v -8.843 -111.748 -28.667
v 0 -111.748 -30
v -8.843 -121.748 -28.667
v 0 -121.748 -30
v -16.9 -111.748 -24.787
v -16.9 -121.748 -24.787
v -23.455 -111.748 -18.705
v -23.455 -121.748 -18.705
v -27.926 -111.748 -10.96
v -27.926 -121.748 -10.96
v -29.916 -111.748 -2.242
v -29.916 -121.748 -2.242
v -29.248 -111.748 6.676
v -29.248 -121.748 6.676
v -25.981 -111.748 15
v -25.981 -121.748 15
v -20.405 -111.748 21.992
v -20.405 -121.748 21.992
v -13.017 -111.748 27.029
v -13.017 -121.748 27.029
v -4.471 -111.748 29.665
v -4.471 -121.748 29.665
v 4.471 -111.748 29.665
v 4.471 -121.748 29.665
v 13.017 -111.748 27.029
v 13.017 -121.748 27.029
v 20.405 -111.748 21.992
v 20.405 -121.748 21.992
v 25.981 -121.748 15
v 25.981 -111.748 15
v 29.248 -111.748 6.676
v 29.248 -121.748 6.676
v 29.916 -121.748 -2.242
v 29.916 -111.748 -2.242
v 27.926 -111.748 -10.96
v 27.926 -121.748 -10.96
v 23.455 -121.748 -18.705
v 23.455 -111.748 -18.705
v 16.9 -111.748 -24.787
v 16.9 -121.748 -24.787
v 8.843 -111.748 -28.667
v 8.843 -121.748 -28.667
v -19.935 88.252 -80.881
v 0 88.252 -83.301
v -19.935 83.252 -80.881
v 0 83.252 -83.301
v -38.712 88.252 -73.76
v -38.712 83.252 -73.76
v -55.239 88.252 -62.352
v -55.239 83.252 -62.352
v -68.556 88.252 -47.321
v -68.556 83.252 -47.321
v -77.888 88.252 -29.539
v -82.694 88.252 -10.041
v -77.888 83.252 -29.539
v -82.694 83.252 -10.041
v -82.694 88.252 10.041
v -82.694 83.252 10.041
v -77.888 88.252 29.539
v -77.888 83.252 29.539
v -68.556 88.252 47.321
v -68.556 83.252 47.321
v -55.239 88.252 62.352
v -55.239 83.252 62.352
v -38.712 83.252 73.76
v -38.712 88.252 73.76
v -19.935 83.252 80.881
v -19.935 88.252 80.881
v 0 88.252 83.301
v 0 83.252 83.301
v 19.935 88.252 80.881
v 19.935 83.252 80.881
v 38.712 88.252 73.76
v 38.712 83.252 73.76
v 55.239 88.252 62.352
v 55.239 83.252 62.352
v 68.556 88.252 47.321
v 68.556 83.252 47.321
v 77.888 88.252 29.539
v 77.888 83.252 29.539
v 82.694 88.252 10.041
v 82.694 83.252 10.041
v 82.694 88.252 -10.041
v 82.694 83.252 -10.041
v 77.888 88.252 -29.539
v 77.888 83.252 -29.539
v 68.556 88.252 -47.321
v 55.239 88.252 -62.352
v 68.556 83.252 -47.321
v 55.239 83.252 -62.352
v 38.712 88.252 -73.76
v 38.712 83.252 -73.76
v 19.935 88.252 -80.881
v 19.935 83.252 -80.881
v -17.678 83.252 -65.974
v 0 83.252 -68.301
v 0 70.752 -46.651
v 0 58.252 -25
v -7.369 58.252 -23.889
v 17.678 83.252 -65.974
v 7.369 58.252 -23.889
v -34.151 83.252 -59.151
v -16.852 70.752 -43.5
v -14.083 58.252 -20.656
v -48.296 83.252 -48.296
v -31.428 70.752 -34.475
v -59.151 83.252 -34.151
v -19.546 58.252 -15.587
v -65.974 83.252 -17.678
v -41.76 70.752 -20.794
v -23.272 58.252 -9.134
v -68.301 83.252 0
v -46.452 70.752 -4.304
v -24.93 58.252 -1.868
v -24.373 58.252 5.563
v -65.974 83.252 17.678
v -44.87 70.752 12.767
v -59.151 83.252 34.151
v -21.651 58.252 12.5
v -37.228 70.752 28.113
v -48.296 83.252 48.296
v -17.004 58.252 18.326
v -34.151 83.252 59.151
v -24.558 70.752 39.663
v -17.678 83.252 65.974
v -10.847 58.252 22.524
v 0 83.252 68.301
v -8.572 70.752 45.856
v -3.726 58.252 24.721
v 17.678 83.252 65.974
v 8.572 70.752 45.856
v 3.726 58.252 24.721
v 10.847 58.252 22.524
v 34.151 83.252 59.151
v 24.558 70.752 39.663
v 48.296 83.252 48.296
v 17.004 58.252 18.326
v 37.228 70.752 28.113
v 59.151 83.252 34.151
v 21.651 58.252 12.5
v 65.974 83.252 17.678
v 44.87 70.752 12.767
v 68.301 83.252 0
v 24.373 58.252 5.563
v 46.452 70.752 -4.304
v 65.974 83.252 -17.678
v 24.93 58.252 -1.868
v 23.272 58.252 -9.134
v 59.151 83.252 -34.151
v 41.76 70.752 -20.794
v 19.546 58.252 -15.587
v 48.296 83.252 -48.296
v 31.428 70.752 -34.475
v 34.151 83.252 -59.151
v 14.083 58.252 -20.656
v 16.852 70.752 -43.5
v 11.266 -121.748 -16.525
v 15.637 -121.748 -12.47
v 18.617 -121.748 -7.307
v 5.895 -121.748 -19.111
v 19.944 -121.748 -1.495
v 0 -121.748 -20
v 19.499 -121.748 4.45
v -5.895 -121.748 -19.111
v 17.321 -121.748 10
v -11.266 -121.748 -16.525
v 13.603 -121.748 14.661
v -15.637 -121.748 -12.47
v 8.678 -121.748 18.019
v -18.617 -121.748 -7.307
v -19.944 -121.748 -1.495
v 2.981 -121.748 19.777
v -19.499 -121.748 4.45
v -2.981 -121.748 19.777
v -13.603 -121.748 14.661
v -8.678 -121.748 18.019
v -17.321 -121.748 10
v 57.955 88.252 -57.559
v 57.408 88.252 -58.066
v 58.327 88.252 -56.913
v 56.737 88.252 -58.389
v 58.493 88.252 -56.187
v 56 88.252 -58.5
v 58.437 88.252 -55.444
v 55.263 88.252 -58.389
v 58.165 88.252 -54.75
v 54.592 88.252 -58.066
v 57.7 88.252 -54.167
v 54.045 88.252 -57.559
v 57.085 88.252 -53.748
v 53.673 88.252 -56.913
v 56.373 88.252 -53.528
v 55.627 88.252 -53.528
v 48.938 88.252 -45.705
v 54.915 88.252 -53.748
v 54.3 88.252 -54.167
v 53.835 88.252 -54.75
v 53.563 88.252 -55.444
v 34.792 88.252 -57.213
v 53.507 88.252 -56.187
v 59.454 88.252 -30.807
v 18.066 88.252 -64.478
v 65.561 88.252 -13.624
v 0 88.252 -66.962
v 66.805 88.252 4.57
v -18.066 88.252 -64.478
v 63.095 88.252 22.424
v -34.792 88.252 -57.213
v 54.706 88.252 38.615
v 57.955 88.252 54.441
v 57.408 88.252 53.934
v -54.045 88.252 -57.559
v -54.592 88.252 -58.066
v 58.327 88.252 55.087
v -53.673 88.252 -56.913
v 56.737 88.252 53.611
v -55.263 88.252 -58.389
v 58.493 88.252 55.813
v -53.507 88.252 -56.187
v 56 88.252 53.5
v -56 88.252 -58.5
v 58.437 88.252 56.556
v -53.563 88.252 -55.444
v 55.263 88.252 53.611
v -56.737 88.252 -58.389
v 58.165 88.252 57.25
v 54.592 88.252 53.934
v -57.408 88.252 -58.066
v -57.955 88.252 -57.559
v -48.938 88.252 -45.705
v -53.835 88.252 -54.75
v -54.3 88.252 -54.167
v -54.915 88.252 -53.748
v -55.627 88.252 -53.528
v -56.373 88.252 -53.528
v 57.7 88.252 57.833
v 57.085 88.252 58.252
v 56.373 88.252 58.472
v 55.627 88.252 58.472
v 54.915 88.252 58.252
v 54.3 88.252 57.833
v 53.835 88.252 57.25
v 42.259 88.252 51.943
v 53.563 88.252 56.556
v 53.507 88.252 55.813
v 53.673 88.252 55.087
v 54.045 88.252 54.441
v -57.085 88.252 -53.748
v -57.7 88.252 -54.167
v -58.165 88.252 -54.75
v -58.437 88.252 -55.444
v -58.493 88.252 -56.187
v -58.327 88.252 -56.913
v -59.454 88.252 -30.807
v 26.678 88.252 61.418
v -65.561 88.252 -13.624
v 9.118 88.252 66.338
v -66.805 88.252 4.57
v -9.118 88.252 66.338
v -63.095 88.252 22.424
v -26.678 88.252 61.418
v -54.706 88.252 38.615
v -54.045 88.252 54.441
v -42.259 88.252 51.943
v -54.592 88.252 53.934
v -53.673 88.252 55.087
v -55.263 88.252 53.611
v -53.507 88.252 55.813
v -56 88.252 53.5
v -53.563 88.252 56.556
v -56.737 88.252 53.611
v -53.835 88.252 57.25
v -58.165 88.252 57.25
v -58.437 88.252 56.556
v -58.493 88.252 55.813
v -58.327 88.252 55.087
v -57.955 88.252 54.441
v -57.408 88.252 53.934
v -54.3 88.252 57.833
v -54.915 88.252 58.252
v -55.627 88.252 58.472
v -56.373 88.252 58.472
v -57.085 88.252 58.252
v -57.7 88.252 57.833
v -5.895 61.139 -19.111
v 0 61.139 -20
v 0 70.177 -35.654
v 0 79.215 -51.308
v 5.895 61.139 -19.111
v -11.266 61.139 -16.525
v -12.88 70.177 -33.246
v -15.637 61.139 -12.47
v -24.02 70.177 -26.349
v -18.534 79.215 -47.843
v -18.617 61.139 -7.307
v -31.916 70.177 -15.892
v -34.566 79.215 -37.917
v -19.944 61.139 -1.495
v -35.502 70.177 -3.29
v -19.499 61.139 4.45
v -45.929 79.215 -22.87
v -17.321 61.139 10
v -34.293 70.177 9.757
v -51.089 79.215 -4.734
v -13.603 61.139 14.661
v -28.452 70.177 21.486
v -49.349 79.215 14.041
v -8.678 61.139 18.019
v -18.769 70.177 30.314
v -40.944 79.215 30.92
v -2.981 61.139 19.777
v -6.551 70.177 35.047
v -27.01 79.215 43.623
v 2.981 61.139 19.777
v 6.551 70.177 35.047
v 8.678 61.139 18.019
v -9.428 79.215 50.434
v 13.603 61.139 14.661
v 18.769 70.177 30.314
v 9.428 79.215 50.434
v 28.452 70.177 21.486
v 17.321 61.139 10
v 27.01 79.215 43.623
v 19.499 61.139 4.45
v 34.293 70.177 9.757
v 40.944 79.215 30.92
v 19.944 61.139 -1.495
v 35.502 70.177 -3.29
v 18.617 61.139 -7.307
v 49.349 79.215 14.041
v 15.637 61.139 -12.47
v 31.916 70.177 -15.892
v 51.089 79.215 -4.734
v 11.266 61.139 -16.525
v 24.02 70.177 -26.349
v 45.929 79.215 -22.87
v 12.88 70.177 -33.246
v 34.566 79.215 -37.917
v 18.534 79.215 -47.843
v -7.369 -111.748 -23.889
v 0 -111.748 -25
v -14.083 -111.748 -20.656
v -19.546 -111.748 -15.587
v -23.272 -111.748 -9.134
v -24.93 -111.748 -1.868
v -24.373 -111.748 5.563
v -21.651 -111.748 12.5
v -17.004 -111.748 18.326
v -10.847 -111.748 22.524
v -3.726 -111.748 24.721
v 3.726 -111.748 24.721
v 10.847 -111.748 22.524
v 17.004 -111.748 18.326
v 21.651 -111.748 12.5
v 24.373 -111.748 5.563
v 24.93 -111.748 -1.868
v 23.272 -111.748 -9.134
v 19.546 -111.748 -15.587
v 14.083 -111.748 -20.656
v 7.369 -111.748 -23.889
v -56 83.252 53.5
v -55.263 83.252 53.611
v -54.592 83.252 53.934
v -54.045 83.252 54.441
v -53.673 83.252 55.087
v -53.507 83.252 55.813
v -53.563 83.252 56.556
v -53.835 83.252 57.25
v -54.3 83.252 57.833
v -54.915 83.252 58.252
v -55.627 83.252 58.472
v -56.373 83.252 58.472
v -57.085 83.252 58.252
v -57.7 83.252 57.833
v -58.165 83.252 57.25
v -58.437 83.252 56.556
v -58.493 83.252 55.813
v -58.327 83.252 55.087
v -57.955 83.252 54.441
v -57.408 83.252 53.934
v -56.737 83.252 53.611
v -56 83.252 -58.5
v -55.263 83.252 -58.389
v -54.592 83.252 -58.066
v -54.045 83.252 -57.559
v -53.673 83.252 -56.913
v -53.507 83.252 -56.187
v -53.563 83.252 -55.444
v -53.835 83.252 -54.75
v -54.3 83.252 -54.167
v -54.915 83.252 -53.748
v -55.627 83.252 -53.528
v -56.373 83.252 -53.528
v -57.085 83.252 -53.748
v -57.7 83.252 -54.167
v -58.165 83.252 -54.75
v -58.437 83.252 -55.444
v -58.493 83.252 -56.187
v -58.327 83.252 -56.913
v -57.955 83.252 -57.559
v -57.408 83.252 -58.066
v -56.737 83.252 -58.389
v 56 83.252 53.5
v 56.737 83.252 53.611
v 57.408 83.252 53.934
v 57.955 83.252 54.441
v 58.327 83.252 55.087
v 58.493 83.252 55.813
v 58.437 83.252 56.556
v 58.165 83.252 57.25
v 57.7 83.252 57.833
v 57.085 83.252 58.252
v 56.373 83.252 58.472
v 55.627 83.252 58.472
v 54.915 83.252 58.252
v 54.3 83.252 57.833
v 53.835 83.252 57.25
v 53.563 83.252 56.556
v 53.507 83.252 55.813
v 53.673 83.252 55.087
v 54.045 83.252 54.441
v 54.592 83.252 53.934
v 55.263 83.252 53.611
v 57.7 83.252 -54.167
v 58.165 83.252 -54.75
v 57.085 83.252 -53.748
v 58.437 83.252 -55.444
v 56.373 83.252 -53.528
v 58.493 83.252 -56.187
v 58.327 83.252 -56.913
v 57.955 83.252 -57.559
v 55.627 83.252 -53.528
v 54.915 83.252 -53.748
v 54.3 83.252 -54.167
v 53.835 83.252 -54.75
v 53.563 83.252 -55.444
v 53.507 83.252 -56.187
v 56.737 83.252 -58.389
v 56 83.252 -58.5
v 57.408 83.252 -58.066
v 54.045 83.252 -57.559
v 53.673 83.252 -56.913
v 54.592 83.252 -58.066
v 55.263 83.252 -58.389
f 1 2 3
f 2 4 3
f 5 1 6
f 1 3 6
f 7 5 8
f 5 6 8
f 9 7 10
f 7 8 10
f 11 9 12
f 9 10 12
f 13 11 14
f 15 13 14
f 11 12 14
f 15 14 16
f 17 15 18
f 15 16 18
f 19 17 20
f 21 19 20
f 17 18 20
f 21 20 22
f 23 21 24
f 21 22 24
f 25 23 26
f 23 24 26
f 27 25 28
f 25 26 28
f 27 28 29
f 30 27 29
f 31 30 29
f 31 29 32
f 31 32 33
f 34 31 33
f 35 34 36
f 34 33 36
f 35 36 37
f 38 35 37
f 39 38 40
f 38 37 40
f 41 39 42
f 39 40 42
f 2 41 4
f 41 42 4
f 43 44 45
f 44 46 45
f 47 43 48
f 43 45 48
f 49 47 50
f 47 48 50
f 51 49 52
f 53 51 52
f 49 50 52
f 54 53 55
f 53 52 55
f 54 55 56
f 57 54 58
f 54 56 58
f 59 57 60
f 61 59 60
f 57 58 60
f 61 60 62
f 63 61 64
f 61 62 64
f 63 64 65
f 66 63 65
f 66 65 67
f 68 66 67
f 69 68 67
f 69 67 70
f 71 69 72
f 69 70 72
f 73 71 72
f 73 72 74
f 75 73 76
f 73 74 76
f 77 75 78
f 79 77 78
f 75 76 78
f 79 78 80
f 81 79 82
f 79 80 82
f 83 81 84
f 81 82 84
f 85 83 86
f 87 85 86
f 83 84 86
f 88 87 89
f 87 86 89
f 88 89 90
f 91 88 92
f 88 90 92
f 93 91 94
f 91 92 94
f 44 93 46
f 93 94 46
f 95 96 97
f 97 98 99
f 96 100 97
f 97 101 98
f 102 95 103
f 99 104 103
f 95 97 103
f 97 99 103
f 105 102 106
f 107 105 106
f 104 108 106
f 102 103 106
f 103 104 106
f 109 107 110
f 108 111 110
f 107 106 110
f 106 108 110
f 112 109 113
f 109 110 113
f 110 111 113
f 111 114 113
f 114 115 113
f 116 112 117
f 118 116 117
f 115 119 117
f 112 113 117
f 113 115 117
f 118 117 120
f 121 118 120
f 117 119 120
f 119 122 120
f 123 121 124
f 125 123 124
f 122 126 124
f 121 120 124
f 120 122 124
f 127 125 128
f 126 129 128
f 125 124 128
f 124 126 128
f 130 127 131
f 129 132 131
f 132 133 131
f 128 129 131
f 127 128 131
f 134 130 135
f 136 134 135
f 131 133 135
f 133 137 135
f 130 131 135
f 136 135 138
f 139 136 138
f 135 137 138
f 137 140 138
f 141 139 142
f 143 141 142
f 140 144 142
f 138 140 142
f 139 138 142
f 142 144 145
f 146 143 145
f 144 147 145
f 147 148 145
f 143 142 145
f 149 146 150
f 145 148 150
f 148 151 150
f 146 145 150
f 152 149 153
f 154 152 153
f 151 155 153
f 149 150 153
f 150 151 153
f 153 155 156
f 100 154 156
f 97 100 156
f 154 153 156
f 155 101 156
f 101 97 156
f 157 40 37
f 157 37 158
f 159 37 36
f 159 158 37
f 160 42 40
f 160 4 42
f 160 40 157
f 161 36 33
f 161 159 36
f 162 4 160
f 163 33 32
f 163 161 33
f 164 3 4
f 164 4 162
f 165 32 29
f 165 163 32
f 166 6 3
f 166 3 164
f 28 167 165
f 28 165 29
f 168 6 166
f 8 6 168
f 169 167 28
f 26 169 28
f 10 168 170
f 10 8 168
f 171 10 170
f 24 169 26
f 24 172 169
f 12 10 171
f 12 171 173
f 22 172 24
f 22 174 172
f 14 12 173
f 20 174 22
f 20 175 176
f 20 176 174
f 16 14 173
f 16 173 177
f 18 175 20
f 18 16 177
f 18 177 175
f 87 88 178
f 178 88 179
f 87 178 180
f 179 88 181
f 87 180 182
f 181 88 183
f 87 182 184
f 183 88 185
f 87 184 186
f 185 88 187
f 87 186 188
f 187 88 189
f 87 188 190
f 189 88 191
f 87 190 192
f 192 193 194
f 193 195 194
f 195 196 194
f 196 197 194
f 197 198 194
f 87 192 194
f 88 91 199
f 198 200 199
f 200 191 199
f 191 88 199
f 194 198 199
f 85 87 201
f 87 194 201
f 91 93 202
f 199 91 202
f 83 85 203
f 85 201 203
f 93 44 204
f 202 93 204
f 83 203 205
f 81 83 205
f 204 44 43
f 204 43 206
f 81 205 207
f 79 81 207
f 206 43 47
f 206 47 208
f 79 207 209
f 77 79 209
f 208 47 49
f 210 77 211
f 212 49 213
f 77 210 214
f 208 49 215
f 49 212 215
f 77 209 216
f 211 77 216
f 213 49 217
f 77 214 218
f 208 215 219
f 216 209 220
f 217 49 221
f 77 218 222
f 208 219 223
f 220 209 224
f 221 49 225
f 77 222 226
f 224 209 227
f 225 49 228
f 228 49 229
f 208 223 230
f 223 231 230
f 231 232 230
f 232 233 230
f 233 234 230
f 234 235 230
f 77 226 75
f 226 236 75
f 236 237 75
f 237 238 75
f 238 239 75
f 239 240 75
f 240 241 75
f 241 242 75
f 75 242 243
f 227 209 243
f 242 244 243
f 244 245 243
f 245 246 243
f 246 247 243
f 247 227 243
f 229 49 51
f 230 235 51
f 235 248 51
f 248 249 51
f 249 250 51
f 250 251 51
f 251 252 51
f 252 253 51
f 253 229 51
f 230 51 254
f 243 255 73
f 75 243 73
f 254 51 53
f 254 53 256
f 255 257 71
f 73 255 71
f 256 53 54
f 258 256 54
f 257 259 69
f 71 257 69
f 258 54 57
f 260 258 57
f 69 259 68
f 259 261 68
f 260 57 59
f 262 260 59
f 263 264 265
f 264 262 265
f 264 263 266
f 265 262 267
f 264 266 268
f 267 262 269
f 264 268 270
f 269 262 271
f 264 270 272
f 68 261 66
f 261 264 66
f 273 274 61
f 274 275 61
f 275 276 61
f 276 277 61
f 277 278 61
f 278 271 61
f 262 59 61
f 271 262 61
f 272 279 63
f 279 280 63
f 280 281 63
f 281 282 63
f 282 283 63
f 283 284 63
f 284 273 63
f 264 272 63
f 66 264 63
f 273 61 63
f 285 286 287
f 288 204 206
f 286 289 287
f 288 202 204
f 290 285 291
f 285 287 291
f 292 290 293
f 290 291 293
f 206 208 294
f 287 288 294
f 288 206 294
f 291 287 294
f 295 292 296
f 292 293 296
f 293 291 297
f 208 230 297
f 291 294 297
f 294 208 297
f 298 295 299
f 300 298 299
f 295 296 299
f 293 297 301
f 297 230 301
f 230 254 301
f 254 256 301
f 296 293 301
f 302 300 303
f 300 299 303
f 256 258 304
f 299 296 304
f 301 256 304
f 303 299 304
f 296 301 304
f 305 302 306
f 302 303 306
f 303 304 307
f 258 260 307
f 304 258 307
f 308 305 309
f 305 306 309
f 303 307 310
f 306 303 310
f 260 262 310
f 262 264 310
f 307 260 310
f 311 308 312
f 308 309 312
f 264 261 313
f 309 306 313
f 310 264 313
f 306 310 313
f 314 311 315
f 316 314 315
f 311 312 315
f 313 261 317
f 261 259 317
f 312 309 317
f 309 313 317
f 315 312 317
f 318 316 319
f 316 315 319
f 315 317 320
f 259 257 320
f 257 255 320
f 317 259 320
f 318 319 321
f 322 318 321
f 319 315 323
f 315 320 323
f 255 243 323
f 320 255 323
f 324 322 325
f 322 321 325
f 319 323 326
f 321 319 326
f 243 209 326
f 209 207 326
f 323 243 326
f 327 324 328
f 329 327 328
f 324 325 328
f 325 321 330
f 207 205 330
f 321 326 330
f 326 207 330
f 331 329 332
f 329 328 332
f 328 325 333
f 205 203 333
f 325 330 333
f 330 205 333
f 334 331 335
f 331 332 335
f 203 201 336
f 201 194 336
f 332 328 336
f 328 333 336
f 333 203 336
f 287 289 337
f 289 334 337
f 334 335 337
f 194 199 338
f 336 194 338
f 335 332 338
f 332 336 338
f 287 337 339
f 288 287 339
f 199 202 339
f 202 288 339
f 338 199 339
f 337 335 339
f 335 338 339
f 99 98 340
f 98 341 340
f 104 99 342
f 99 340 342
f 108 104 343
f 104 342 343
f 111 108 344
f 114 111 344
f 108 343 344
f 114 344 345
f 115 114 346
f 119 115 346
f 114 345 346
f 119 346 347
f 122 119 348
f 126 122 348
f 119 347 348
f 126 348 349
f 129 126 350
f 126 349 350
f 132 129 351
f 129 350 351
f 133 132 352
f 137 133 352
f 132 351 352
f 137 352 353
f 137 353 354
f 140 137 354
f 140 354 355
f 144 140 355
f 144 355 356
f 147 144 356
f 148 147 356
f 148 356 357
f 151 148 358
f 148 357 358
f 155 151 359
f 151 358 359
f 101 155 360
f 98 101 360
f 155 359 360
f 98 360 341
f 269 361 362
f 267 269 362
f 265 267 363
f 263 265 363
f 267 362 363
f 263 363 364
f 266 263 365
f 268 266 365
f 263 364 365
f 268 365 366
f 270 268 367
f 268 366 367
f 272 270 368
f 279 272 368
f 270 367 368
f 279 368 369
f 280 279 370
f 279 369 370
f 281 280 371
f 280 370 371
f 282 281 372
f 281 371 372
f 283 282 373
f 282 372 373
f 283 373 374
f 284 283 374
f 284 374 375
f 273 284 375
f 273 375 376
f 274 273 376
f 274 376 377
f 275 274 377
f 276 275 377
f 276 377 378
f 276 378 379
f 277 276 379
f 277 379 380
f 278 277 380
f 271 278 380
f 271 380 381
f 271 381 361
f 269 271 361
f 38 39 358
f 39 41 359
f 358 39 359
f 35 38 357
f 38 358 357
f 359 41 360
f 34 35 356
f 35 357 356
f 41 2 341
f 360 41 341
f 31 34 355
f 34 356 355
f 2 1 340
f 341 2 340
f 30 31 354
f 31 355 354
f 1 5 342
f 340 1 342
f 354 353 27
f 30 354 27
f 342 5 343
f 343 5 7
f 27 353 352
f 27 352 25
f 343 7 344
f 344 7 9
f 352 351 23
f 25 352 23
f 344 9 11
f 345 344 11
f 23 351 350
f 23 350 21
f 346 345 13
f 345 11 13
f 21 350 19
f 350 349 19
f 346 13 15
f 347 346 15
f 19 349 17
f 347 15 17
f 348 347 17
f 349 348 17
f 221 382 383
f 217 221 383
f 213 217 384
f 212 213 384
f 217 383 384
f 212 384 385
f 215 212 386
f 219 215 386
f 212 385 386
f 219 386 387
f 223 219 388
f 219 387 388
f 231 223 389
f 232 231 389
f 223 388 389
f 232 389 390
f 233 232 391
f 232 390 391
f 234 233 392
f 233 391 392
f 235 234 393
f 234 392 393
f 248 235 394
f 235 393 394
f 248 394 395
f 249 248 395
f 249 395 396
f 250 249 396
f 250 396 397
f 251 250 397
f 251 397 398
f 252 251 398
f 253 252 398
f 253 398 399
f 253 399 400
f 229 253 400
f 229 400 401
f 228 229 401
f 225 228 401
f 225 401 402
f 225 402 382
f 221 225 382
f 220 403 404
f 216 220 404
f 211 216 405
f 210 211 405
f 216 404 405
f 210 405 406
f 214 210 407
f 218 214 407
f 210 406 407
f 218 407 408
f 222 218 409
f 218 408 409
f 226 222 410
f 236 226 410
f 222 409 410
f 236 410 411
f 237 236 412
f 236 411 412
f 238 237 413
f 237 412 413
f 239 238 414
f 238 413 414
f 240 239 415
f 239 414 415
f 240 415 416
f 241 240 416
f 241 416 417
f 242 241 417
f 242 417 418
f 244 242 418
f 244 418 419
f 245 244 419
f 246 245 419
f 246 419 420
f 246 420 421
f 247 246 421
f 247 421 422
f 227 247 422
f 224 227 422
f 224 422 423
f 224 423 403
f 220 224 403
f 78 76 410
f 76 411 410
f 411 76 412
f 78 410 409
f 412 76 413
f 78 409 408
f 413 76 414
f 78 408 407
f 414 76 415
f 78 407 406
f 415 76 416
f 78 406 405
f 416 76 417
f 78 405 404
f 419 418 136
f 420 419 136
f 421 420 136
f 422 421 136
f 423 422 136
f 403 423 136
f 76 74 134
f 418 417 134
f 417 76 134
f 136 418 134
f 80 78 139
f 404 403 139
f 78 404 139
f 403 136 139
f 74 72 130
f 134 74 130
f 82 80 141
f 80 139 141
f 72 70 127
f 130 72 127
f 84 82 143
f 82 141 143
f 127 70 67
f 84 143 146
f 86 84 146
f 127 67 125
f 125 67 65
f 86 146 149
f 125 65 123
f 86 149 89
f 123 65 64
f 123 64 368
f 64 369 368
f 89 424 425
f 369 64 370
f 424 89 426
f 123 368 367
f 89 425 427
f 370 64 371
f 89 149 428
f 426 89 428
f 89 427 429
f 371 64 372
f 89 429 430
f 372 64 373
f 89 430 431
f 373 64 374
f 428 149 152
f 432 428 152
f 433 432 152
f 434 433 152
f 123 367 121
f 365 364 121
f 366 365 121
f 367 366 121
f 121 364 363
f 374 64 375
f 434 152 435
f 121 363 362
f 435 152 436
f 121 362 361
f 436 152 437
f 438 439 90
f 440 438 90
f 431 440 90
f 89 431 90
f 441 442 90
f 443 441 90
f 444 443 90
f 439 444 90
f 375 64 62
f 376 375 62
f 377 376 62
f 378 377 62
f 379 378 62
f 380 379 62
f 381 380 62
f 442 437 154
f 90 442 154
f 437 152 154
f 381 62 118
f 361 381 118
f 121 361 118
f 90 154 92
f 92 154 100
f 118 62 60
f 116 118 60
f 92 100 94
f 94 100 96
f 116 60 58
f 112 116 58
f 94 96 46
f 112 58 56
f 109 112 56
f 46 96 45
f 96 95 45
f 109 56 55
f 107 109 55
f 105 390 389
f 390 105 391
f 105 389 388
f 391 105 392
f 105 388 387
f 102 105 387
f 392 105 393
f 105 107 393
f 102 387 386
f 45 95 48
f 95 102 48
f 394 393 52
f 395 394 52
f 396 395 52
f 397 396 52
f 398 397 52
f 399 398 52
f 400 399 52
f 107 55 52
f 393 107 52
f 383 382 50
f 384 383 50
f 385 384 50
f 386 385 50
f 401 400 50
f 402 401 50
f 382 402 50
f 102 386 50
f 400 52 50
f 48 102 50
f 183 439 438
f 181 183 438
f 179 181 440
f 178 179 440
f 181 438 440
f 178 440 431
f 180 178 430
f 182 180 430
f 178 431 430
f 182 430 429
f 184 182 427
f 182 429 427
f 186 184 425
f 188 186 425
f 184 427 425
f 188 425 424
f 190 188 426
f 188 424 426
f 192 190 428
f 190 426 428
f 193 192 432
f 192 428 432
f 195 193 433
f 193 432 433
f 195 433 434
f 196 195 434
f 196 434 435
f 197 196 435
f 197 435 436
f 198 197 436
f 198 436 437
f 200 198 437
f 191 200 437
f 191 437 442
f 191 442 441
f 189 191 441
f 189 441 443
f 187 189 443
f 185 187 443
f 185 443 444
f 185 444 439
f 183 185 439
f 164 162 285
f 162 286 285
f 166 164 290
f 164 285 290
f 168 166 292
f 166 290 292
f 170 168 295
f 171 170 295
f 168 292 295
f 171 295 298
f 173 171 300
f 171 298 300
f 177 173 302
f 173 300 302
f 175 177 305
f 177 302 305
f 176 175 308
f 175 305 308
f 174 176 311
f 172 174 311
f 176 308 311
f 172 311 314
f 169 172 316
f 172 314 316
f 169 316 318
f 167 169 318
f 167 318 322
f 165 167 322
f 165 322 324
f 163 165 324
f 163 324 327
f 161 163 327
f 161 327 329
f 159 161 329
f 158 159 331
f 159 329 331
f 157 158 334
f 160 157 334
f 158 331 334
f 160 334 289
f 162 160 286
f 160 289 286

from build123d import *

# Parameters (mm, degrees)
M6_TAPPED_HOLE1_D = 5


with BuildPart() as part:
    # Sketch1 → Revolve1 (revolve)
    with BuildSketch(Plane.XY, mode=Mode.PRIVATE) as revolve1_sk:
        Polygon((20, -121.747729768), (20, 61.139021578), (66.961524227, 88.252270232), (83.301270189, 88.252270232), (83.301270189, 83.252270232), (68.301270189, 83.252270232), (25, 58.252270232), (25, -111.747729768), (30, -111.747729768), (30, -121.747729768), (25, -121.747729768), align=None)
    revolve(revolve1_sk.sketch.rotate(Axis((0, 0, 0), (0, 1, 0)), 90), axis=Axis((0, 0, 0), (0, 1, 0)))

    # M6 Tapped Hole1 (through all)
    with Locations(Plane(origin=(-56, 88.252270232, -56), x_dir=(0, 0, 1), z_dir=(0, 1, 0))):
        with Locations((0, 0), (0, 112), (112, 0), (112, 112)):
            Hole(M6_TAPPED_HOLE1_D / 2)


solid = part.part
